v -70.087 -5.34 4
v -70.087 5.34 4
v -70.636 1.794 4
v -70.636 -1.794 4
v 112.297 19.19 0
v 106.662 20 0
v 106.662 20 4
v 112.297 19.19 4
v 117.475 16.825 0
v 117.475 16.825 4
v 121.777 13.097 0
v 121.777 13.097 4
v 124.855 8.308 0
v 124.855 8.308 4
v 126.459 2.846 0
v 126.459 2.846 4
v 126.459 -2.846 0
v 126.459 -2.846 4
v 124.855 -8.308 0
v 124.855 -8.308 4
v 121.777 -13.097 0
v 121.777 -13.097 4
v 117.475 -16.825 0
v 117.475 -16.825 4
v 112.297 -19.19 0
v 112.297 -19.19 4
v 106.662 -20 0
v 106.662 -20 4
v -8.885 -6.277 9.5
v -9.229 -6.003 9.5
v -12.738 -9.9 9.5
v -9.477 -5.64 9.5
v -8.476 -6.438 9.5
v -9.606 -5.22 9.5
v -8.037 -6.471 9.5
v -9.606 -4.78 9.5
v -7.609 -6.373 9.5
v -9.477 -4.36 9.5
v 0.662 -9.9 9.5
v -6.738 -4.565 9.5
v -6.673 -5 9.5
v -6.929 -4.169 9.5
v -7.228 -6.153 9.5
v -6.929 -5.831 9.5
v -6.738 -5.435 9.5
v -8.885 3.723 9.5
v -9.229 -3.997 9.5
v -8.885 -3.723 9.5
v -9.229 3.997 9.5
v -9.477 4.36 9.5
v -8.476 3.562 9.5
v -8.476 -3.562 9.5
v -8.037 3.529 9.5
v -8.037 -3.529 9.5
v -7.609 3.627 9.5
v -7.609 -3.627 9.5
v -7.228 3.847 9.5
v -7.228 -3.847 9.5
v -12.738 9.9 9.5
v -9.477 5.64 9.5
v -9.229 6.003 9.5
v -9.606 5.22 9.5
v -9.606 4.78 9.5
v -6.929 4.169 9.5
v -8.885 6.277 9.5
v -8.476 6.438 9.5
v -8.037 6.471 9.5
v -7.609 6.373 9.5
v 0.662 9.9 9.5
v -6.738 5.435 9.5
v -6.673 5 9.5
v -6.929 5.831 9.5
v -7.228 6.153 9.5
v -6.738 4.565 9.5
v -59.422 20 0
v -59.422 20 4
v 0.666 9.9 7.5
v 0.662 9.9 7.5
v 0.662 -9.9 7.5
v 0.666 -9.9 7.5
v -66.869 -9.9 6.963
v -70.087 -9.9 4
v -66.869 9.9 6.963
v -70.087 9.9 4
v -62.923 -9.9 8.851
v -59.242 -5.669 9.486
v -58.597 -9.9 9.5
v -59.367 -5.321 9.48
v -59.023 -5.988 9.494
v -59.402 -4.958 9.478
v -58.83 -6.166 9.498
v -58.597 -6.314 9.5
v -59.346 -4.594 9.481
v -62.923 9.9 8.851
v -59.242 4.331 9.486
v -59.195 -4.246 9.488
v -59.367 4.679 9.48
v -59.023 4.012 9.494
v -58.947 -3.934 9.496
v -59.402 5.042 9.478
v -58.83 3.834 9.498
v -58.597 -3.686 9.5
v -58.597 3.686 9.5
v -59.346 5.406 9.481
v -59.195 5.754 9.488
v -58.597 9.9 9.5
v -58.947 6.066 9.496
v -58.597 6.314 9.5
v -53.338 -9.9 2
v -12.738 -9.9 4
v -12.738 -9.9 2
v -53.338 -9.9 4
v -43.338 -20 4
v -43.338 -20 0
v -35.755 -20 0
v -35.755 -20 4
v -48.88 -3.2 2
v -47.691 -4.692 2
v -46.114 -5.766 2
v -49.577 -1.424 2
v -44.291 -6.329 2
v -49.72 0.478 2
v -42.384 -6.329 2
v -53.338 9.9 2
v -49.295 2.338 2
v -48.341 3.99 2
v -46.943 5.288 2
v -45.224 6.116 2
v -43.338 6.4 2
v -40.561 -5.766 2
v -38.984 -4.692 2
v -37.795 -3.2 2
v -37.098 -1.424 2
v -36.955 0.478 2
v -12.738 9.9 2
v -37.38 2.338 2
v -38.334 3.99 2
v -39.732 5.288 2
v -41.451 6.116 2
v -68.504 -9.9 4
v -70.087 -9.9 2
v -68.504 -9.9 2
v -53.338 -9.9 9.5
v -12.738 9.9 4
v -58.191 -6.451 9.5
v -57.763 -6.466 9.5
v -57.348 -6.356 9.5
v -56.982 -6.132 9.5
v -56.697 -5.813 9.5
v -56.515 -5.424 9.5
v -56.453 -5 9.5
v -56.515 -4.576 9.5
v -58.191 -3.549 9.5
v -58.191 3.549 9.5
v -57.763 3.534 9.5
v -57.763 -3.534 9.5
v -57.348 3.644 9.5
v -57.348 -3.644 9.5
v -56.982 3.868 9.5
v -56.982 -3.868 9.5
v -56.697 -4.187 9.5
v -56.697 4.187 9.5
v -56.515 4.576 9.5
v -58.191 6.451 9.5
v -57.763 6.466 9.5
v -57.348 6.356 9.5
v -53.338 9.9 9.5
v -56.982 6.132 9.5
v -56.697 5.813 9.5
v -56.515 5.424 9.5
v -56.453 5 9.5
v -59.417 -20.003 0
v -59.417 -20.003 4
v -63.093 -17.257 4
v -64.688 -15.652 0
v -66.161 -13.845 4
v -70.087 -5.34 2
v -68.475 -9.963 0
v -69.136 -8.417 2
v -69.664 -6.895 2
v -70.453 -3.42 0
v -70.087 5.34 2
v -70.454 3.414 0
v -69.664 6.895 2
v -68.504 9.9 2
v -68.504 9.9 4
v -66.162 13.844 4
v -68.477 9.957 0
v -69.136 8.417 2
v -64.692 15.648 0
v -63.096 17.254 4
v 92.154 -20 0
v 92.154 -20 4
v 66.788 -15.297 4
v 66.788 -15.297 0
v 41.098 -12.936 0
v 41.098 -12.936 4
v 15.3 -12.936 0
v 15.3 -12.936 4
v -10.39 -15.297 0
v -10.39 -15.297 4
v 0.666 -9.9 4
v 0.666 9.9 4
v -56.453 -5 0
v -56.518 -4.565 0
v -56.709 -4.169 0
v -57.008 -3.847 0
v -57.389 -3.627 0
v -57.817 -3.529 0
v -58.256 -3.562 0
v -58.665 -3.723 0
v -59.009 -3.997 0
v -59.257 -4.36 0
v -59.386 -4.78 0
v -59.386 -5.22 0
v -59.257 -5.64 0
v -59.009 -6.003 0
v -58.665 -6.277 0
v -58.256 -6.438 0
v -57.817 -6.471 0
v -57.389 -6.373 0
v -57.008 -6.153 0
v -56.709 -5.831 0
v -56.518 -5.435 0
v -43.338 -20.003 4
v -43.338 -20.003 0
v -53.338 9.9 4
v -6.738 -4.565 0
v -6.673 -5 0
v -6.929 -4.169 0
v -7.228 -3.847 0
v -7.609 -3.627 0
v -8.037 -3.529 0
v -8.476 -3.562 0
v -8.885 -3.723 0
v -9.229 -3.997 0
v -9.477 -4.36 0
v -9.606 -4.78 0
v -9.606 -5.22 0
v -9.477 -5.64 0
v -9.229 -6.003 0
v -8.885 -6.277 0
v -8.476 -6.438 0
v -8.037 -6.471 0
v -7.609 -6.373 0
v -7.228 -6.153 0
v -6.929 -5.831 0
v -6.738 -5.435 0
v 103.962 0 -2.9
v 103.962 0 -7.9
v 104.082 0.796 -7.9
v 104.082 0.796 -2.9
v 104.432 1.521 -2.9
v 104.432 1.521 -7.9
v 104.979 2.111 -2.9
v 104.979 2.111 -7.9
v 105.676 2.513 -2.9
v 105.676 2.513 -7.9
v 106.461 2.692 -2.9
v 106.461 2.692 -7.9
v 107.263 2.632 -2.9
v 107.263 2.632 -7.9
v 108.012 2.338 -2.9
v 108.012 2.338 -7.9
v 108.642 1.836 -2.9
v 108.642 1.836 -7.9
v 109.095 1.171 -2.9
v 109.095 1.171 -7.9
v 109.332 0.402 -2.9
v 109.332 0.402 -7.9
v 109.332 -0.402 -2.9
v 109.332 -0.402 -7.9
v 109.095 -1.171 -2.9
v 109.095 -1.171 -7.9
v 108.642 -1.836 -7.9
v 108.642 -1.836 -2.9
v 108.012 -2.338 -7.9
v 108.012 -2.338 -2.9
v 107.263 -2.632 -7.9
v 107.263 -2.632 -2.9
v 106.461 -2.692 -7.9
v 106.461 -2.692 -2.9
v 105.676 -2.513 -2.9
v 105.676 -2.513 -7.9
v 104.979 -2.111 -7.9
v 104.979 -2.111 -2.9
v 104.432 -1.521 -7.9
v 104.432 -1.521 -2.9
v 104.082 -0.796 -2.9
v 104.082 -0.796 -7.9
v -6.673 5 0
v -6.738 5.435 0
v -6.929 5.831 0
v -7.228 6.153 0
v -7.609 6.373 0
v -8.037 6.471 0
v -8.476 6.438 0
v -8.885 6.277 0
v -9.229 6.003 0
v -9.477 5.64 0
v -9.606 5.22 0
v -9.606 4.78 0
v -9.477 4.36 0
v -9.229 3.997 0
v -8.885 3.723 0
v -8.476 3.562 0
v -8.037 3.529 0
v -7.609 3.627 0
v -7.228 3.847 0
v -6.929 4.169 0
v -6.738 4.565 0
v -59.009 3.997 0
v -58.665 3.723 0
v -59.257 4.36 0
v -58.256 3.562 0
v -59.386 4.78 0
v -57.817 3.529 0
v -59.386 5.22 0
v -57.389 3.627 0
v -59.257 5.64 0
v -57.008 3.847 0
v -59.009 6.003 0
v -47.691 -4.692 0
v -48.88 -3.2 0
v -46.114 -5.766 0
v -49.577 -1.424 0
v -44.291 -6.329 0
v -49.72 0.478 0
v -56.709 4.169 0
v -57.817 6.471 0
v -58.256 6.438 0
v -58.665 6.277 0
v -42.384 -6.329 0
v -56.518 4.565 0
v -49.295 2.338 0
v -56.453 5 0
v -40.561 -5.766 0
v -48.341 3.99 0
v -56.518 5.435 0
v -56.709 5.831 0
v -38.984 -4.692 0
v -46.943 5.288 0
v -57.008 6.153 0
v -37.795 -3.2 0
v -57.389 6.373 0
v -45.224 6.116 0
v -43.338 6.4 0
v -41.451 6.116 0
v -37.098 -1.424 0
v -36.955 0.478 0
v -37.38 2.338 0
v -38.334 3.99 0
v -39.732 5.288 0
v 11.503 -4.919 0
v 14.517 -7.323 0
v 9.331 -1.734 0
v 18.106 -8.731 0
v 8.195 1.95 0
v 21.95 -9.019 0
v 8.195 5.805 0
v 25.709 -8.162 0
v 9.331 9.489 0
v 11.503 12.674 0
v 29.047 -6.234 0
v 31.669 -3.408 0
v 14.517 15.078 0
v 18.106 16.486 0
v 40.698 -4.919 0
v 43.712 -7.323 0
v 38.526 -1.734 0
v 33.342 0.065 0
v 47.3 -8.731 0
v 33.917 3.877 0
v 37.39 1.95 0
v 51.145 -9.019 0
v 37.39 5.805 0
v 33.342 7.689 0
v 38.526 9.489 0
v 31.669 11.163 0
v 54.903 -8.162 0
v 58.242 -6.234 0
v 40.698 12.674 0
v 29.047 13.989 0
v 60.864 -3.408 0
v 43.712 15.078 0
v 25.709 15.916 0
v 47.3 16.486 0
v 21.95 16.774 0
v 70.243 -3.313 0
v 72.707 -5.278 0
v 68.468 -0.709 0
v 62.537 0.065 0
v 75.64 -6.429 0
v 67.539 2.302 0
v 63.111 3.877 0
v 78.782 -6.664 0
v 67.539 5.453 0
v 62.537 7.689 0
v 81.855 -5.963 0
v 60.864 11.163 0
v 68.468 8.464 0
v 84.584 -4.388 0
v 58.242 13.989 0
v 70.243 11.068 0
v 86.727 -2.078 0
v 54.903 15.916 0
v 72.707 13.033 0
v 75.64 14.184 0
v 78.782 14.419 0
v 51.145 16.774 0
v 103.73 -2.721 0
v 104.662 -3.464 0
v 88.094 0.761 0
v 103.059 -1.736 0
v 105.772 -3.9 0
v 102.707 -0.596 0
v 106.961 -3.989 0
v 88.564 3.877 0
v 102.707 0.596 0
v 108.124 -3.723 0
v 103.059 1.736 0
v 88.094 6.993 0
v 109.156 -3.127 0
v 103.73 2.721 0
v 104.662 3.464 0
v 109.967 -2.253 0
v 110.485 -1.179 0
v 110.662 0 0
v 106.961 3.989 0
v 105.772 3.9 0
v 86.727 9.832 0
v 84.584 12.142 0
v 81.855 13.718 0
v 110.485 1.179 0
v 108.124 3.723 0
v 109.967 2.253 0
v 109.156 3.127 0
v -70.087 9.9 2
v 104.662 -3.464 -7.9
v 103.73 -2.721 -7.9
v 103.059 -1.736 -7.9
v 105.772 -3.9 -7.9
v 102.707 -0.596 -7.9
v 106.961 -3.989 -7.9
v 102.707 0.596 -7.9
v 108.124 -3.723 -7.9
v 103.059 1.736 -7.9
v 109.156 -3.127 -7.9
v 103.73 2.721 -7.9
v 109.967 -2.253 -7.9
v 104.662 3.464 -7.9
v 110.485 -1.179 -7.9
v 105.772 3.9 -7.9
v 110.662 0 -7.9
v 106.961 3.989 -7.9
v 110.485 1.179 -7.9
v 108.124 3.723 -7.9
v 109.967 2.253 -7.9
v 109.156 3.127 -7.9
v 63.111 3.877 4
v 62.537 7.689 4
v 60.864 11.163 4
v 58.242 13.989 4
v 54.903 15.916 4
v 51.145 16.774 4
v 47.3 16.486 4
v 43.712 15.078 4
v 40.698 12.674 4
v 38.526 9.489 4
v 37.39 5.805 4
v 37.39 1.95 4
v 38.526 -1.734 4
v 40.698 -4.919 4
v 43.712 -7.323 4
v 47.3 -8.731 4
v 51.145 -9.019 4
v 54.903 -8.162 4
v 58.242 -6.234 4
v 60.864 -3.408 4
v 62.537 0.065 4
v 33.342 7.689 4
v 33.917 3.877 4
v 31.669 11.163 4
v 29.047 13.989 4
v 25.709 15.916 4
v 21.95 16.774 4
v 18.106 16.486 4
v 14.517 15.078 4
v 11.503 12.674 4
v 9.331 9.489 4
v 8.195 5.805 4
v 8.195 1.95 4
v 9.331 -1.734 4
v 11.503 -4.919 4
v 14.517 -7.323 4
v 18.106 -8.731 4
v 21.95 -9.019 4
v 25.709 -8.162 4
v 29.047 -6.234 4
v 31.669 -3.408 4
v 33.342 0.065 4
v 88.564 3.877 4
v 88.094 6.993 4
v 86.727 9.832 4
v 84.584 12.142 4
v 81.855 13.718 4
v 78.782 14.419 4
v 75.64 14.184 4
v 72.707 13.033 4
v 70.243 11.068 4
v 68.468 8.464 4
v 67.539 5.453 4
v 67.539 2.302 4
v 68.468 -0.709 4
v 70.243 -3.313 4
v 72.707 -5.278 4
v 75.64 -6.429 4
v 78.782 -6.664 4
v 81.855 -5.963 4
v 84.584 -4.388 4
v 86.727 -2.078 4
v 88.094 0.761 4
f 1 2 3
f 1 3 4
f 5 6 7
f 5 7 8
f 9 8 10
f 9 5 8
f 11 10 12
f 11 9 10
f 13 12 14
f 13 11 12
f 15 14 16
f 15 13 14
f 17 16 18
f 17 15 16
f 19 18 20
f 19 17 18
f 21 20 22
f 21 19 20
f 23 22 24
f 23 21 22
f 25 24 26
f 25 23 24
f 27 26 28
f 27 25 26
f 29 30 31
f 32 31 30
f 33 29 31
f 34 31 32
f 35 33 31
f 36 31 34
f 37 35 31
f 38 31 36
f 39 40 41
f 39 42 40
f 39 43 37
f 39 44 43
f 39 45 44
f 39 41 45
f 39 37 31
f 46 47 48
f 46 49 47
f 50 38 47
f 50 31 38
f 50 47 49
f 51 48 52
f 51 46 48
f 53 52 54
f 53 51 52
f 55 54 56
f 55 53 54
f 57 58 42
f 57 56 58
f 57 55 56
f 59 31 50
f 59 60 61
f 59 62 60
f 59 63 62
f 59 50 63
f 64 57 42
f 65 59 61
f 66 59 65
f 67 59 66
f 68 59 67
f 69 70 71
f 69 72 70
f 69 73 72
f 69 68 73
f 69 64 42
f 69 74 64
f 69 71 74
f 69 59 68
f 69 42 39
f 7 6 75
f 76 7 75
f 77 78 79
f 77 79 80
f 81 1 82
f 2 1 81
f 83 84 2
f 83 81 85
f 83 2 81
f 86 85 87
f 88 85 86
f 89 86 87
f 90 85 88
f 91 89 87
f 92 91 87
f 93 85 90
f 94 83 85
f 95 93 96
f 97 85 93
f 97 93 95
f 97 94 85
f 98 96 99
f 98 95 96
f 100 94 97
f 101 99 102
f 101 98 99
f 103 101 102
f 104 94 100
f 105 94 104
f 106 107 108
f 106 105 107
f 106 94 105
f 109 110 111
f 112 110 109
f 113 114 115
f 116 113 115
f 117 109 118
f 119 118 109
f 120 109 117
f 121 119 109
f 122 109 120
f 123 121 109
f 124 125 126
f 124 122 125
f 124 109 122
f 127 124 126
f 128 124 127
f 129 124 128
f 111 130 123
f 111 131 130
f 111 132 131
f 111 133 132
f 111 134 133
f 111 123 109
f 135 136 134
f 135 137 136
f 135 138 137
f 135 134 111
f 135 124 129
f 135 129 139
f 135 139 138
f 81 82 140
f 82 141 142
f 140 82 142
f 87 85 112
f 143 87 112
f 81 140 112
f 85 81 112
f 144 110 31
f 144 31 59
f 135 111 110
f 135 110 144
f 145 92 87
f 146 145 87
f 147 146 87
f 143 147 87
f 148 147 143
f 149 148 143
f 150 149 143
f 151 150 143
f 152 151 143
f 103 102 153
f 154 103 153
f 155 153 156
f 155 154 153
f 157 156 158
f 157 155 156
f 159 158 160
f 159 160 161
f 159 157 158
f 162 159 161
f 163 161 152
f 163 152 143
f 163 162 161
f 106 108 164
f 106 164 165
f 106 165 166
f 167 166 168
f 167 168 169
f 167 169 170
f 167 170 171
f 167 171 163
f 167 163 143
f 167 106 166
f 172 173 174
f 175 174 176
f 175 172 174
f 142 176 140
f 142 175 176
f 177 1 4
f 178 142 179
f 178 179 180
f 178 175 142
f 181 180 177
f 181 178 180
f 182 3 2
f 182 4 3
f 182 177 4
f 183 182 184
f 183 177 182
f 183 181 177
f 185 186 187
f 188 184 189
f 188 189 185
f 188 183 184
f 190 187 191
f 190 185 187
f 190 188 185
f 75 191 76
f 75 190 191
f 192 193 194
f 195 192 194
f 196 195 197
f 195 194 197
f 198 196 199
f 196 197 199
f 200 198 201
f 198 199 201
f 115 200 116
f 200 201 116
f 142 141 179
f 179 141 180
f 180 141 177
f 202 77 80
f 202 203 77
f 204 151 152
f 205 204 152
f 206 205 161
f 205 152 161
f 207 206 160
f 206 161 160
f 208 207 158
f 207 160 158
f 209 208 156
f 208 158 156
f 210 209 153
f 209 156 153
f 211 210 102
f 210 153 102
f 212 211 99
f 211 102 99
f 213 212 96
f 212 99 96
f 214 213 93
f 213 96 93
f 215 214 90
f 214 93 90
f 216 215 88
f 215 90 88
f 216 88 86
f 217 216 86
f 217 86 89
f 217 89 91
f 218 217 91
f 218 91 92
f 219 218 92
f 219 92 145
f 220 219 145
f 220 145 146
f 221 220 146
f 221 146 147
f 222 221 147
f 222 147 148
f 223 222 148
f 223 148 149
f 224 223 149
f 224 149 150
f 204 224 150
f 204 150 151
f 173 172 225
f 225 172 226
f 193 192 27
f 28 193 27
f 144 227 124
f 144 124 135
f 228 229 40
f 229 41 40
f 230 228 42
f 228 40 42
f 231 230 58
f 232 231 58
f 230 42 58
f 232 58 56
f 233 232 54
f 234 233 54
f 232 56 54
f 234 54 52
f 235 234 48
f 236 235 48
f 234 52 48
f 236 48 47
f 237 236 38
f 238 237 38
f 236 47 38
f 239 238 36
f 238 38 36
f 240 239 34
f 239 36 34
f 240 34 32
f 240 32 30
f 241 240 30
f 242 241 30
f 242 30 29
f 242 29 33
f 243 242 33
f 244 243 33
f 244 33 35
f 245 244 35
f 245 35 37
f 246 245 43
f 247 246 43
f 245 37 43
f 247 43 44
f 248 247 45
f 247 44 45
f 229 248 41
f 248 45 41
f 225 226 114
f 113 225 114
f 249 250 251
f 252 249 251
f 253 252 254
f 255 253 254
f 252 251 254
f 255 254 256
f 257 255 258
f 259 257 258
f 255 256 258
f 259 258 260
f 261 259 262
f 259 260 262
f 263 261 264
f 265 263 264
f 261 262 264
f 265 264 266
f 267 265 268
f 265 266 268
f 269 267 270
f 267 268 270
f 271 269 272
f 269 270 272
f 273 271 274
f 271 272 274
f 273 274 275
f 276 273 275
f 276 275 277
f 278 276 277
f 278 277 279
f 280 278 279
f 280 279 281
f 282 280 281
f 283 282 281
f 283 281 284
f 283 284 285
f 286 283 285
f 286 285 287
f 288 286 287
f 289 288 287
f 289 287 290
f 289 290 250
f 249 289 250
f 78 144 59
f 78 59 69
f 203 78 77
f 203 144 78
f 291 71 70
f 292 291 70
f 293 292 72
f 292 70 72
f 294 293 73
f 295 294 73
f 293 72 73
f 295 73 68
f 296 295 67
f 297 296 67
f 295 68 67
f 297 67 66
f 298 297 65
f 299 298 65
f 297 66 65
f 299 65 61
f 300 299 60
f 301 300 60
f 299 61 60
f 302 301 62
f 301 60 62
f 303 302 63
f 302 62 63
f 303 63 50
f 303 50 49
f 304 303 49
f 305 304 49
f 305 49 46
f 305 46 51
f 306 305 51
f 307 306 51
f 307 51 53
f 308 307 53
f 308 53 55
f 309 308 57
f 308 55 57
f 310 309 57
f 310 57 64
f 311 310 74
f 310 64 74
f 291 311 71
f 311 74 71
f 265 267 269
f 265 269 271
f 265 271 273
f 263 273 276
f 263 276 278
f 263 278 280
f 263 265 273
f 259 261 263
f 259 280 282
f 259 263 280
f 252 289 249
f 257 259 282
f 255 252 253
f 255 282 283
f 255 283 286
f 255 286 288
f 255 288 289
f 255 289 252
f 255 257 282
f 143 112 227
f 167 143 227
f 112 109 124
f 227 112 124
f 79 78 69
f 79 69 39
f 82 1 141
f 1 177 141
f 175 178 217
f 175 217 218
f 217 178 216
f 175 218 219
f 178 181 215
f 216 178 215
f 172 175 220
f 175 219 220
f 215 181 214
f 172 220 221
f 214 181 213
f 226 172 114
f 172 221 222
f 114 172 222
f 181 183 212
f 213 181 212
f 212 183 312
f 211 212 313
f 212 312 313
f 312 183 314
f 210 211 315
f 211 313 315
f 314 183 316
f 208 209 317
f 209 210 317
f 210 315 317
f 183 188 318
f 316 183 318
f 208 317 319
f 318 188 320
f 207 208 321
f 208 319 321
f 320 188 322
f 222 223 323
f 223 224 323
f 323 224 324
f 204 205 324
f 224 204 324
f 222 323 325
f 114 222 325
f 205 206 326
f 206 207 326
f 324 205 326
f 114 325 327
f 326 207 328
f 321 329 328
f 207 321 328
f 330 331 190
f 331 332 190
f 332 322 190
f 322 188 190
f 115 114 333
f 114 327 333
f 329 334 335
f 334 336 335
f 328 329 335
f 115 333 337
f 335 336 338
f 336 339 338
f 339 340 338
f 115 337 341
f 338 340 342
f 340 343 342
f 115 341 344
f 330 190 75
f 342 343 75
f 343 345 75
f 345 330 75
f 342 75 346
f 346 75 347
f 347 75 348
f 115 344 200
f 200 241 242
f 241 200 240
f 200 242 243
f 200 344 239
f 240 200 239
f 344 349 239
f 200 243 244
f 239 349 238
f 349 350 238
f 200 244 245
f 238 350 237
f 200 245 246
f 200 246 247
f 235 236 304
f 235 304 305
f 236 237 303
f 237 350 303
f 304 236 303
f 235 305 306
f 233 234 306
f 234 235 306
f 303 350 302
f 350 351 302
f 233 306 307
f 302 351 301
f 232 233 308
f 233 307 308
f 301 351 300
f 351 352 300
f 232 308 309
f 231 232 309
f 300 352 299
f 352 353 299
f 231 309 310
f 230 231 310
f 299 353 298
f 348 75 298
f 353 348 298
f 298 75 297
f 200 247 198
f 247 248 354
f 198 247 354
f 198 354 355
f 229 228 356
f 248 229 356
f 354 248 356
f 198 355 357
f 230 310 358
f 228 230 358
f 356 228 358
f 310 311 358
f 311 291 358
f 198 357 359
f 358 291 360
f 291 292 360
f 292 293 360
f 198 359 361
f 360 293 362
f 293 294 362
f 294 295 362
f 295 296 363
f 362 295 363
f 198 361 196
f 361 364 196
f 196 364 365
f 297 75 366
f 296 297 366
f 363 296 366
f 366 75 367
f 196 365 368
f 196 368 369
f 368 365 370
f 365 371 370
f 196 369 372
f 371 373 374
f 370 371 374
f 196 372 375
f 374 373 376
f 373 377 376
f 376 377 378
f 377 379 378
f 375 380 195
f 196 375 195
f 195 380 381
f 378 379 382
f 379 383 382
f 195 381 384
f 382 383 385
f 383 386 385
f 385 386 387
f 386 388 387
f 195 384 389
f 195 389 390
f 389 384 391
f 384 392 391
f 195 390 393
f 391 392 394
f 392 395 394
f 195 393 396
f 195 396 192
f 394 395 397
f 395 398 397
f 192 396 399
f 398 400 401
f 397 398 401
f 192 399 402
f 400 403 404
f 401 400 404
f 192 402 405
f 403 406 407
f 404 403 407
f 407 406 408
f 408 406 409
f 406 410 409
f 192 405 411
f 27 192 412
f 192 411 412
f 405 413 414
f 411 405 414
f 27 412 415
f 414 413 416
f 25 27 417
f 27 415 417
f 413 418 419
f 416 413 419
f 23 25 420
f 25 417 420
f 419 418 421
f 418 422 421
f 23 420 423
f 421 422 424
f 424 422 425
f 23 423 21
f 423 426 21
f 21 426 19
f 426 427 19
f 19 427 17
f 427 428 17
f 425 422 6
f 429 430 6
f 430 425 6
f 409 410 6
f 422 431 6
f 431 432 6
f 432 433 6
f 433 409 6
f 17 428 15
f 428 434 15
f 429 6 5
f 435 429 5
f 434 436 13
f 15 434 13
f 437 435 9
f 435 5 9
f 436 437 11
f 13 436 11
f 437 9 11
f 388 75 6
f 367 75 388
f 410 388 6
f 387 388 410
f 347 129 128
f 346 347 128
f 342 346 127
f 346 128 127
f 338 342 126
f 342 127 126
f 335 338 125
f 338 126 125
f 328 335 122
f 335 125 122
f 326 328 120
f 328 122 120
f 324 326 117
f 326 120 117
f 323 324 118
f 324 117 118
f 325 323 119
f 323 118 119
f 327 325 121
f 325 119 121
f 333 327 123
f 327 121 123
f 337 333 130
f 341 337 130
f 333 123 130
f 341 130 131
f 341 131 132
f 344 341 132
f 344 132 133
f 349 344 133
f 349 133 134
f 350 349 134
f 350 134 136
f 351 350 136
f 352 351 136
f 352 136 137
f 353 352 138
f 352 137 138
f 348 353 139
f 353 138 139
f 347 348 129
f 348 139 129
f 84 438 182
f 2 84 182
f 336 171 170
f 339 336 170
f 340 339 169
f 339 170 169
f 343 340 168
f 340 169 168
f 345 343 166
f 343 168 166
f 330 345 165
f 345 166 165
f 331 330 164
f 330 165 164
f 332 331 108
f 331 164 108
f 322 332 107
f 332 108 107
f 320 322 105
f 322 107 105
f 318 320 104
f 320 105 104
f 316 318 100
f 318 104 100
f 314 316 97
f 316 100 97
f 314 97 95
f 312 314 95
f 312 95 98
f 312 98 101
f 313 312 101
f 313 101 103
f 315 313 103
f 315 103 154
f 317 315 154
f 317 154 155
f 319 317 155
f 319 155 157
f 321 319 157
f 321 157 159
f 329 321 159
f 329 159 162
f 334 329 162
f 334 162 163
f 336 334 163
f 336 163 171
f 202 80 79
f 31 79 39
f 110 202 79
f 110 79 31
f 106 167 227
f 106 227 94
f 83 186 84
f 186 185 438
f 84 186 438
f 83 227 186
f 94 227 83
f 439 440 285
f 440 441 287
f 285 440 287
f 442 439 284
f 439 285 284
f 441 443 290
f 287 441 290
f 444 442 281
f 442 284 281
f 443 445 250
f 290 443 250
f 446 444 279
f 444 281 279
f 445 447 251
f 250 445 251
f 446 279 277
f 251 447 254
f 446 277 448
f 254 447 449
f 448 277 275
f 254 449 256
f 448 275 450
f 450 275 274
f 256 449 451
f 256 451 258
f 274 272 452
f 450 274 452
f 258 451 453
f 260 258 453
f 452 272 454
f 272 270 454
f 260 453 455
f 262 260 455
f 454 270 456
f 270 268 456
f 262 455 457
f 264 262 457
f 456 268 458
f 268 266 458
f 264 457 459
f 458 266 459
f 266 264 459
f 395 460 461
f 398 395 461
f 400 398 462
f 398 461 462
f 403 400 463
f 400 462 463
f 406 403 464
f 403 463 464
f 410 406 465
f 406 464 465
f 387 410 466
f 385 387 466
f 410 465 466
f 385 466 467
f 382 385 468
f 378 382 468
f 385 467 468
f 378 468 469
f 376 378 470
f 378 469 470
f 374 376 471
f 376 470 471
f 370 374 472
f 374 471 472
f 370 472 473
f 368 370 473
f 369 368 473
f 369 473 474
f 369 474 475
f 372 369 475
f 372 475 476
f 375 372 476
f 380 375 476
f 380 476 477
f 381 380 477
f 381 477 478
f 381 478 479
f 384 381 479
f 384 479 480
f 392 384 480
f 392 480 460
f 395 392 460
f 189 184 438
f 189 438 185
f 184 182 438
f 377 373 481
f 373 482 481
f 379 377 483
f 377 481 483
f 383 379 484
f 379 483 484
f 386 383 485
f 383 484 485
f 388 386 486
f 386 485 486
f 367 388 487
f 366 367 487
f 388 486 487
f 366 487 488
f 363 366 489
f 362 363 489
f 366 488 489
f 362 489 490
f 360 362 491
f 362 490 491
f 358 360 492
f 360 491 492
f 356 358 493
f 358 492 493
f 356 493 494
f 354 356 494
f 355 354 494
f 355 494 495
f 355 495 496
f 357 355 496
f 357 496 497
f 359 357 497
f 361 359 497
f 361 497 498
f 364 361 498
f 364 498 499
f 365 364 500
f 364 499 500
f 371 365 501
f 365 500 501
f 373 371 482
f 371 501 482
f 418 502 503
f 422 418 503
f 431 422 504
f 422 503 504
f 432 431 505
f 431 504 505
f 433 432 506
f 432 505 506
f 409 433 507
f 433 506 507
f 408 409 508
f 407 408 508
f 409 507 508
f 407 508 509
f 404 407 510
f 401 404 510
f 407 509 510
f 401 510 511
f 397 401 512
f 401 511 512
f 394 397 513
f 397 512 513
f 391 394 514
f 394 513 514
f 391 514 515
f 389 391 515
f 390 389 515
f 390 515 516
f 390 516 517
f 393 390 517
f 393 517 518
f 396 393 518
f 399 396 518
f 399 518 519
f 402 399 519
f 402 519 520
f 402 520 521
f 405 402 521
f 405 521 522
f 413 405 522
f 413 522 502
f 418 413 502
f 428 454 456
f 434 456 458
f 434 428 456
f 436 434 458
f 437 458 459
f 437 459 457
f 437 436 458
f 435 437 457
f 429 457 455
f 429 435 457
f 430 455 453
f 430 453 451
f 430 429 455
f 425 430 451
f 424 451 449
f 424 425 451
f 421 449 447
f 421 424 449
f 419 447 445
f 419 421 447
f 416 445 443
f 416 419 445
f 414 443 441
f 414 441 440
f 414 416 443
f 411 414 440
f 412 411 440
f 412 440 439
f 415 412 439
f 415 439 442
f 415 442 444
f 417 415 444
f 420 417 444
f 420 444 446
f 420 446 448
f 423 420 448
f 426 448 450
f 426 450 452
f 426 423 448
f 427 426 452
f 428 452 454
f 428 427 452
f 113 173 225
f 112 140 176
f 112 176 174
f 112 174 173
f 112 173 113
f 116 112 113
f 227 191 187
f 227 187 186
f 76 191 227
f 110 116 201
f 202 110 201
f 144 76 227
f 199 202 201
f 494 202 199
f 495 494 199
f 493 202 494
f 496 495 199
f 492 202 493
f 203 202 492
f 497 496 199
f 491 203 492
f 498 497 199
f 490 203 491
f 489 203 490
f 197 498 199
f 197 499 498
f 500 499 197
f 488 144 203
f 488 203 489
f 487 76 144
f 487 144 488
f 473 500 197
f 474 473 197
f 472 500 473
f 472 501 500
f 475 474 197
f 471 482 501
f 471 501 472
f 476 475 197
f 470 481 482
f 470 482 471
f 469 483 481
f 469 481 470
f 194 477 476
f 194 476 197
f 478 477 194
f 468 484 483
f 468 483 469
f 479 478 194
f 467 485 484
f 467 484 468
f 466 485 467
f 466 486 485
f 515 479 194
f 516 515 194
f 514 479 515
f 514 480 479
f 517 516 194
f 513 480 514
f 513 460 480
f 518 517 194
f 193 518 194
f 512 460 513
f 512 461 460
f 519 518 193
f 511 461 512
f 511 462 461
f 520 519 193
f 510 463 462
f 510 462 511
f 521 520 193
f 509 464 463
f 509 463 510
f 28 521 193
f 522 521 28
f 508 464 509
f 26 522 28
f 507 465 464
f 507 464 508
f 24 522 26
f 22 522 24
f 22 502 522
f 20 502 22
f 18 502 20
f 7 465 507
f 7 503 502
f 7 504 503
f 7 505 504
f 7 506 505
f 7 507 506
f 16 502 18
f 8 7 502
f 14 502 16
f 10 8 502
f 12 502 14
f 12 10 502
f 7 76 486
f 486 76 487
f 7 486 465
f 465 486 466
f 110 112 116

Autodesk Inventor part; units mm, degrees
ref_plane "YZ Plane" through (0, 0, 0) normal (1, 0, 0) x (0, 1, 0)
ref_plane "XZ Plane" through (0, 0, 0) normal (0, 1, 0) x (-1, 0, 0)
ref_plane "XY Plane" through (0, 0, 0) normal (0, 0, 1) x (1, 0, 0)
sketch "Sketch1" plane through (0, 0, 0) normal (0, 0, 1) x (1, 0, 0)
  line L0 (-43.3376, 0) -> (106.6624, 0) construction
  line L1 (-43.3376, -20) -> (106.6624, -20)
  line L2 (106.6624, 20) -> (-43.3376, 20)
  arc A0 (-43.3376, 20) -> (-43.3376, -20) centre (-43.3376, 0) ccw
  arc A1 (106.6624, -20) -> (106.6624, 20) centre (106.6624, 0) ccw
  point P0 (0, 0)
  point P1 (31.6624, 0)
  dimension "d0" = 150
  dimension "d1" = 20
extrude "Extrusion1" add sketch "Sketch1" along normal blind 4
sketch "Sketch2" plane through (0, 0, 4) normal (0, 0, 1) x (1, 0, 0)
  arc A0 (-43.3376, 20) -> (-43.3376, -20) centre (-43.3376, 0) ccw projected
  arc A1 (106.6624, -20) -> (106.6624, 20) centre (106.6624, 0) ccw projected
  circle A2 centre (-43.3376, 0) radius 6.4
  circle A3 centre (106.6624, 0) radius 4
  point P0 (0, 0)
  dimension "d4" = 12.8
  dimension "d5" = 8
extrude "Extrusion2" add sketch "Sketch2" against normal blind 11.9 contours A3
sketch "Sketch5" plane through (0, 0, 4) normal (0, 0, 1) x (1, 0, 0)
  line L0 (-43.3376, -20) -> (106.6624, -20) projected
  arc A0 (92.1536, -20) -> (-35.7554, -20) centre (28.1991, -294.1981) ccw
  point P0 (0, 0)
extrude "Extrusion5" cut sketch "Sketch5" against normal through all
sketch "Sketch6" plane through (0, 0, 0) normal (0, 0, -1) x (-1, 0, 0)
  point P0 (0, 0)
sketch "Sketch7" plane through (106.6624, 0, -7.9) normal (0, 0, -1) x (-1, 0, 0)
  circle A0 centre (0, 0) radius 2.7
  point P0 (106.6624, 0)
  dimension "d18" = 5.4
extrude "Extrusion6" cut sketch "Sketch7" against normal blind 5
sketch "Sketch8" plane through (0, 0, 0) normal (0, 0, -1) x (-1, 0, 0)
  point P0 (0, 0)
extrude "Extrusion7" cut sketch "Sketch2" along normal mid plane 11.9 contours A2
sketch "Sketch9" plane through (106.6624, 0, -7.9) normal (0, 0, -1) x (-1, 0, 0)
  point P0 (106.6624, 0)
sketch "Sketch10" plane through (0, 0, 0) normal (0, 0, -1) x (-1, 0, 0)
  point P0 (0, 0)
sketch "Sketch11" plane through (0, 0, 4) normal (0, 0, 1) x (1, 0, 0)
  line L0 (-70.0866, 9.9) -> (0.6664, 9.9)
  line L1 (0.6664, 9.9) -> (0.6664, -9.9)
  line L2 (0.6664, -9.9) -> (-70.0866, -9.9)
  line L3 (-70.0866, -9.9) -> (-70.0866, 9.9)
  line L4 (-70.0866, 9.9) -> (0.6664, -9.9) construction
  line L5 (0.6664, 9.9) -> (-70.0866, -9.9) construction
  circle A0 centre (-43.3376, 0) radius 6.4 projected
  point P0 (0, 0)
  point P1 (-34.7101, 0)
  dimension "d23" = 70.753
  dimension "d24" = 19.8
  dimension "d25" = 26.749
  dimension "d26" = 9.9
sketch "Sketch12" plane through (0, 0, 4) normal (0, 0, 1) x (1, 0, 0)
  circle A0 centre (-43.3376, 0) radius 6.4 projected
  point P0 (0, 0)
ref_plane "Work Plane1" through (0, 0, 2) normal (0, 0, 1) x (1, 0, 0)
sketch "Sketch13" plane through (0, 0, 2) normal (0, 0, 1) x (1, 0, 0)
  arc A0 (-43.3376, 20) -> (-60.7155, 9.9) centre (-43.3376, 0) ccw projected
  line L0 (-43.3376, 20) -> (-59.4218, 20)
  line L1 (-59.4166, -20.0032) -> (-43.3376, -20.0032)
  line L2 (-43.3376, -20.0032) -> (-43.3376, 20)
  circle A1 centre (-43.3376, 0) radius 4 projected
  arc A2 (-59.4218, 20) -> (-59.4166, -20.0032) centre (-47.3376, 0) ccw
  point P0 (0, 0)
  point P1 (-43.3376, -4)
  point P2 (-43.3376, 4)
extrude "Extrusion9" add sketch "Sketch13" along normal mid plane 4 contours L2 A1 L1 A2 L0
extrude "Extrusion10" cut sketch "Sketch11" against normal blind 2
sketch "Sketch14" plane through (0, 0, 2) normal (0, 0, 1) x (1, 0, 0)
  line L0 (-53.3376, 9.9) -> (-70.0866, 9.9)
  line L1 (-70.0866, 9.9) -> (-70.0866, -9.9)
  line L2 (-70.0866, -9.9) -> (-53.3376, -9.9)
  line L3 (-53.3376, -9.9) -> (-53.3376, 9.9)
  line L4 (-53.3376, 9.9) -> (-70.0866, -9.9) construction
  line L5 (-70.0866, 9.9) -> (-53.3376, -9.9) construction
  arc A0 (-43.3376, -6.4) -> (-43.3376, 6.4) centre (-43.3376, 0) ccw projected
  line L6 (-12.7376, 9.9) -> (0.6624, 9.9)
  line L7 (0.6624, 9.9) -> (0.6624, -9.9)
  line L8 (0.6624, -9.9) -> (-12.7376, -9.9)
  line L9 (-12.7376, -9.9) -> (-12.7376, 9.9)
  line L10 (-12.7376, 9.9) -> (0.6624, -9.9) construction
  line L11 (0.6624, 9.9) -> (-12.7376, -9.9) construction
  point P0 (0, 0)
  point P1 (-61.7121, 0)
  point P2 (-61.7121, -9.9)
  point P3 (-6.0376, 0)
  dimension "d33" = 19.8
  dimension "d34" = 16.749
  dimension "d35" = 10
  dimension "d36" = 13.4
  dimension "d37" = 19.8
  dimension "d38" = 30.6
extrude "Extrusion11" add sketch "Sketch14" along normal blind 7.5
fillet "Fillet3" radius 14.75 1 edges at (-70.0866, 0, 9.5)
sketch "Sketch15" plane through (0, 0, 2) normal (0, 0, 1) x (1, 0, 0)
  line L0 (0.6664, -9.9) -> (0.6624, -9.9) projected
  line L1 (0.6664, 9.9) -> (0.6664, -9.9) projected
  line L2 (0.6624, -9.9) -> (0.6664, -9.9)
  line L3 (0.6664, -9.9) -> (0.6664, 9.9)
  line L4 (0.6664, 9.9) -> (0.6624, 9.9)
  line L5 (0.6624, 9.9) -> (0.6624, -9.9)
  point P0 (0, 0)
extrude "Extrusion12" add sketch "Sketch15" along normal blind 5.5
sketch "Sketch16" plane through (0, 0, 9.5) normal (0, 0, 1) x (1, 0, 0)
  circle A0 centre (-57.9276, -5) radius 1.475
  circle A1 centre (-57.9276, 5) radius 1.475
  line L0 (-58.5975, -9.9) -> (-58.5975, 9.9) projected
  line L1 (-58.5975, -9.9) -> (-53.3376, -9.9) projected
  line L2 (-53.3376, 9.9) -> (-58.5975, 9.9) projected
  circle A2 centre (-8.1476, -5) radius 1.475
  circle A3 centre (-8.1476, 5) radius 1.475
  line L3 (-12.7376, 9.9) -> (-12.7376, -9.9) projected
  line L4 (-12.7376, -9.9) -> (0.6664, -9.9) projected
  line L5 (0.6664, 9.9) -> (-12.7376, 9.9) projected
  arc A4 (-43.3376, -6.4) -> (-43.3376, 6.4) centre (-43.3376, 0) ccw projected
  point P0 (0, 0)
  dimension "d44" = 2.95
  dimension "d45" = 2.95
  dimension "d47" = 4.9
  dimension "d49" = 4.9
  dimension "d50" = 2.95
  dimension "d51" = 2.95
  dimension "d52" = 4.59
  dimension "d53" = 4.59
  dimension "d54" = 4.9
  dimension "d55" = 4.9
  dimension "d60" = 14.59
  dimension "d61" = 14.59
extrude "Extrusion13" cut sketch "Sketch16" against normal blind 10
sketch "Sketch17" plane through (0, 0, 2) normal (0, 0, 1) x (1, 0, 0)
  point P0 (0, 0)
sketch "Sketch18" plane through (0, 0, 2) normal (0, 0, 1) x (1, 0, 0)
  point P0 (0, 0)
extrude "Extrusion14" cut sketch "Sketch12" against normal blind 11.9
sketch "Sketch19" plane through (0, 0, 4) normal (0, 0, 1) x (1, 0, 0)
  circle A0 centre (20.9836, 3.8774) radius 12.933
  circle A1 centre (50.1781, 3.8774) radius 12.933
  circle A2 centre (77.9924, 3.8774) radius 10.5714
  point P0 (0, 0)
extrude "Extrusion15" cut sketch "Sketch19" against normal blind 10
sketch "Sketch20" plane through (0, 0, 2) normal (0, 0, 1) x (1, 0, 0)
  point P0 (0, 0)
properties part number "elbow" material "Aluminum 6061"
